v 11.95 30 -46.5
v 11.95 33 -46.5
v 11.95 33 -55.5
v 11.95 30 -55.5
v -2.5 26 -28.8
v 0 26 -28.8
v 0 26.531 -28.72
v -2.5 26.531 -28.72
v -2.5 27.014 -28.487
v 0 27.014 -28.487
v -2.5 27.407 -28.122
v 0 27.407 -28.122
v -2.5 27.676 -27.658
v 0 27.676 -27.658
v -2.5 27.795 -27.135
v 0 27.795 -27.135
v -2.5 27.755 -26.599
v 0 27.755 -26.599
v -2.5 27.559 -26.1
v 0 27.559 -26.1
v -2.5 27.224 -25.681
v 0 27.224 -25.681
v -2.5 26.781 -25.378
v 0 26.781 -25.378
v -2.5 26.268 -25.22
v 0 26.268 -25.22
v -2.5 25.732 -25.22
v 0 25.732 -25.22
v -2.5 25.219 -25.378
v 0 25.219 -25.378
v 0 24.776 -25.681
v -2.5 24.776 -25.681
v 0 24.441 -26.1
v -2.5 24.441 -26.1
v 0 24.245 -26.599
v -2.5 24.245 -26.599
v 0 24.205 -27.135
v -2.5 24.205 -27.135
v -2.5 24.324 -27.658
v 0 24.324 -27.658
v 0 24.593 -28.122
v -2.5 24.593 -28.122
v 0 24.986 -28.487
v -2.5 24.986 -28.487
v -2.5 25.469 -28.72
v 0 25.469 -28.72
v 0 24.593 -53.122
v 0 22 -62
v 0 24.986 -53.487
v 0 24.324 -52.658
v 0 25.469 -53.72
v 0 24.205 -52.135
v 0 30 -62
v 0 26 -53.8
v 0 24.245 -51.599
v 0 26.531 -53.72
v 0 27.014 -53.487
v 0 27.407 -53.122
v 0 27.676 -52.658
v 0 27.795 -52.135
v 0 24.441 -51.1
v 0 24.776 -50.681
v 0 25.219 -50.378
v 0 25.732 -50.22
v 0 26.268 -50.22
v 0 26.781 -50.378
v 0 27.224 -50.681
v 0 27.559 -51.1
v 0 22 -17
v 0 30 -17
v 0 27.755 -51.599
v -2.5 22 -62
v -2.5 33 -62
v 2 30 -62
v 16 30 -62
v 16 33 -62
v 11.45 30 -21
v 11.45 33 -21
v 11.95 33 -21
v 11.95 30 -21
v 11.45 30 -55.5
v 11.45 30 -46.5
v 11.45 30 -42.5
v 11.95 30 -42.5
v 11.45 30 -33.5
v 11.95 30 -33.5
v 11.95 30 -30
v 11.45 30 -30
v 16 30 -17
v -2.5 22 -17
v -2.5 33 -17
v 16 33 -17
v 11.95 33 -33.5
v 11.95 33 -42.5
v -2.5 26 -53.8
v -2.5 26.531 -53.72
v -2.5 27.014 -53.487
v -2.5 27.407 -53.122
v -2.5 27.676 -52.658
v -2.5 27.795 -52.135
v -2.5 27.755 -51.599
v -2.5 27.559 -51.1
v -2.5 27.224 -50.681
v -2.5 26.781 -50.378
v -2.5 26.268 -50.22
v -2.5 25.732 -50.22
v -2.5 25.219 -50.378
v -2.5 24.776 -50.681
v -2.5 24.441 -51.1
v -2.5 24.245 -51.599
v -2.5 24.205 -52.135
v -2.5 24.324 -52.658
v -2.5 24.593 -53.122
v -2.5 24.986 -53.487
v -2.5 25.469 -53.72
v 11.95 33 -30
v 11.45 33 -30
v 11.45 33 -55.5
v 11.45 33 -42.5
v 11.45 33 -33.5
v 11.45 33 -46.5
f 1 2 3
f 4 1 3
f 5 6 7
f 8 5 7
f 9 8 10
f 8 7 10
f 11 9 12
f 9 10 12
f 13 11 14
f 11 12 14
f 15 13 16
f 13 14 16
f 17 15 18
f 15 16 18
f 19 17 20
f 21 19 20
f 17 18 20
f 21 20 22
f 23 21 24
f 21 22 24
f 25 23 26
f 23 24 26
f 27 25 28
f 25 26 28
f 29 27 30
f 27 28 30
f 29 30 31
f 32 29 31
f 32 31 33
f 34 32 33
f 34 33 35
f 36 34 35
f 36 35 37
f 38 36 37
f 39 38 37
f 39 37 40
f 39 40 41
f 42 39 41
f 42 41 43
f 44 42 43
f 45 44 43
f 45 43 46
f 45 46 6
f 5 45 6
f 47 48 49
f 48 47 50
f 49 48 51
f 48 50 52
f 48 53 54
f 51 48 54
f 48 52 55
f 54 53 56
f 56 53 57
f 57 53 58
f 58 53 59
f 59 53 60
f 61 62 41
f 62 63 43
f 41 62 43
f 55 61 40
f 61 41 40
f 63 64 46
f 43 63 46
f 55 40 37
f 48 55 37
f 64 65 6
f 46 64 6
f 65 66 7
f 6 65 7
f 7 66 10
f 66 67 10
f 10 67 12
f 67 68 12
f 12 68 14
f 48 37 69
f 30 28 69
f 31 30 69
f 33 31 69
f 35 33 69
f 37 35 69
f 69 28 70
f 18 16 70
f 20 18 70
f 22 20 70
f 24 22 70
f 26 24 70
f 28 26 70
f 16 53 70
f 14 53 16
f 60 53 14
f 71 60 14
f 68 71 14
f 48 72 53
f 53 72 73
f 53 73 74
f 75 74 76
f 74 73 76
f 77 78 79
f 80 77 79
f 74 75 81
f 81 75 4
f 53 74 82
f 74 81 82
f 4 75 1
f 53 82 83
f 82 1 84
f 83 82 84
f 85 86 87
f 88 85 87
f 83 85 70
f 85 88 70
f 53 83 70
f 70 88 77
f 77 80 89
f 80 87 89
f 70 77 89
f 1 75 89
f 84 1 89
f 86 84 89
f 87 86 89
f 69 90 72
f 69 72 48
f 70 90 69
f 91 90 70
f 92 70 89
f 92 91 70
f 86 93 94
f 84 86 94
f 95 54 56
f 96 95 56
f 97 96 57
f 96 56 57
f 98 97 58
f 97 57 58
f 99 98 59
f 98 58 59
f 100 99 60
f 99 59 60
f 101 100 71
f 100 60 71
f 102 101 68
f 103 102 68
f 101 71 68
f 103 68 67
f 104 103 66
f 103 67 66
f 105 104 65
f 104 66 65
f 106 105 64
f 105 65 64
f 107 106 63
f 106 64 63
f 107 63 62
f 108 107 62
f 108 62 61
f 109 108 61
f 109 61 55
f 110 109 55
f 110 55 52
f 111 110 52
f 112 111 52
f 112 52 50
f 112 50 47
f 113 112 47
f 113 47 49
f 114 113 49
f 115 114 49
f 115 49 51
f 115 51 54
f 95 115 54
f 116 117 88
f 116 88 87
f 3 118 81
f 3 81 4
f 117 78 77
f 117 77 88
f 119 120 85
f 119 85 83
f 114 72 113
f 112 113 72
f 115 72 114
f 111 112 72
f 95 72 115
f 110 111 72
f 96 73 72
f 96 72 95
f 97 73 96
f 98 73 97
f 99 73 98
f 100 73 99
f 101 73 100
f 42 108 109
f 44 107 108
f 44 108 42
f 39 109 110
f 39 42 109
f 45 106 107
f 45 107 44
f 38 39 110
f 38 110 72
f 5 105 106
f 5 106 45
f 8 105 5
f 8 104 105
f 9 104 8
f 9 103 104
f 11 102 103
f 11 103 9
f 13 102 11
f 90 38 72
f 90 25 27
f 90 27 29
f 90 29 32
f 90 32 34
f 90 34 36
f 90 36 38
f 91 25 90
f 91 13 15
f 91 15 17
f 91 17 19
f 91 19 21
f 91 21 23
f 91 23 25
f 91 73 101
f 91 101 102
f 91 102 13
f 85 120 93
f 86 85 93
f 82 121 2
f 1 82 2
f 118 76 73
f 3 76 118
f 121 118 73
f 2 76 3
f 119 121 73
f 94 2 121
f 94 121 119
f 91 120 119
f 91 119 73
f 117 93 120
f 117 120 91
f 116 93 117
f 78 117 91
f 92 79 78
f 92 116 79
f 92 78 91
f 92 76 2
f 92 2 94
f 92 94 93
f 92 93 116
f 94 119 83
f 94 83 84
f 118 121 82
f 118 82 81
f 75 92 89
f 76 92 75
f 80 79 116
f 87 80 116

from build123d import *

# Parameters (mm, degrees)
SKETCH1_W               = 70.4
SKETCH1_H               = 2
BOSS_EXTRUDE2_DEPTH     = 10
SKETCH2_W               = 2
SKETCH2_H               = 55
BOSS_EXTRUDE3_DEPTH     = 10
SKETCH3_W               = 19
SKETCH3_H               = 3
BOSS_EXTRUDE4_DEPTH     = 2
SKETCH4_W               = 15
SKETCH4_H               = 10
CUT_EXTRUDE2_DEPTH      = 2
SKETCH5_W               = 2
SKETCH5_H               = 3
BOSS_EXTRUDE5_DEPTH     = 1
SKETCH6_W               = 2
SKETCH6_H               = 3
BOSS_EXTRUDE6_DEPTH     = 1
SKETCH7_W               = 57
SKETCH7_H               = 2
BOSS_EXTRUDE7_DEPTH     = 6.6
SKETCH8_W               = 57
SKETCH8_H               = 2
BOSS_EXTRUDE8_DEPTH     = 6.6
BOSS_EXTRUDE9_DEPTH     = 5
SKETCH12_W              = 2
SKETCH12_H              = 5
SKETCH12_H_2            = 40
SKETCH12_H_3            = 30
BOSS_EXTRUDE10_DEPTH    = 20
BOSS_EXTRUDE11_DEPTH    = 3
SKETCH14_W              = 0.5
SKETCH14_H              = 9
CUT_EXTRUDE3_DEPTH      = 3
SKETCH15_W              = 38.4
SKETCH15_H              = 45
CUT_EXTRUDE4_DEPTH      = 3
BOSS_EXTRUDE12_DEPTH    = 0.5
SKETCH17_R              = 1.8
SKETCH17_W              = 3
SKETCH17_H              = 5
CUT_EXTRUDE6_DEPTH      = 3
CUT_EXTRUDE8_DEPTH      = 32
CUT_EXTRUDE8_DEPTH_BACK = 49
SKETCH19_W              = 94.558020587
SKETCH19_H              = 51.225034616
CUT_EXTRUDE9_DEPTH      = 93
CUT_EXTRUDE9_DEPTH_BACK = 18
SKETCH20_W              = 91.945359737
SKETCH20_H              = 40.424662202
SKETCH21_W              = 45
SKETCH21_H              = 3
BOSS_EXTRUDE14_DEPTH    = 2.5
SKETCH22_W              = 2.5
SKETCH22_H              = 45
BOSS_EXTRUDE15_DEPTH    = 8
SKETCH23_R              = 1.8
CUT_EXTRUDE10_DEPTH     = 10


with BuildPart() as part:
    # Sketch1 → Boss-Extrude2 (new body)
    with BuildSketch(Plane(origin=(0, 0, 0), x_dir=(1, 0, 0), z_dir=(0, 1, 0))):
        with Locations((35.2, 1)):
            Rectangle(SKETCH1_W, SKETCH1_H)
    extrude(amount=BOSS_EXTRUDE2_DEPTH)

    # Sketch2 → Boss-Extrude3 (add)
    with BuildSketch(Plane(origin=(0, 10, 0), x_dir=(1, 0, 0), z_dir=(0, 1, 0))):
        with Locations((1, 29.5)):
            Rectangle(SKETCH2_W, SKETCH2_H)
        with Locations((69.4, 29.5)):
            Rectangle(SKETCH2_W, SKETCH2_H)
    extrude(amount=-BOSS_EXTRUDE3_DEPTH)

    # Sketch3 → Boss-Extrude4 (add)
    with BuildSketch(Plane.XY):
        with Locations((35.2, 11.5)):
            Rectangle(SKETCH3_W, SKETCH3_H)
    extrude(amount=-BOSS_EXTRUDE4_DEPTH)

    # Sketch4 → Cut-Extrude2 (cut)
    with BuildSketch(Plane.XY):
        with Locations((35.2, 5)):
            Rectangle(SKETCH4_W, SKETCH4_H)
    extrude(amount=-CUT_EXTRUDE2_DEPTH, mode=Mode.SUBTRACT)

    # Sketch5 → Boss-Extrude5 (add)
    with BuildSketch(Plane.ZY.offset(-25.7)):
        with Locations((-1, 11.5)):
            Rectangle(SKETCH5_W, SKETCH5_H)
    extrude(amount=BOSS_EXTRUDE5_DEPTH)

    # Sketch6 → Boss-Extrude6 (add)
    with BuildSketch(Plane(origin=(44.7, 0, 0), x_dir=(0, 0, -1), z_dir=(1, 0, 0))):
        with Locations((1, 11.5)):
            Rectangle(SKETCH6_W, SKETCH6_H)
    extrude(amount=BOSS_EXTRUDE6_DEPTH)

    # Sketch7 → Boss-Extrude7 (add)
    with BuildSketch(Plane.ZY):
        with Locations((-28.5, 1)):
            Rectangle(SKETCH7_W, SKETCH7_H)
    extrude(amount=BOSS_EXTRUDE7_DEPTH)

    # Sketch8 → Boss-Extrude8 (add)
    with BuildSketch(Plane(origin=(70.4, 0, 0), x_dir=(0, 0, -1), z_dir=(1, 0, 0))):
        with Locations((28.5, 1)):
            Rectangle(SKETCH8_W, SKETCH8_H)
    extrude(amount=BOSS_EXTRUDE8_DEPTH)

    # Sketch10 → Boss-Extrude9 (add)
    with BuildSketch(Plane(origin=(0, 0, -57), x_dir=(-1, 0, 0), z_dir=(0, 0, -1))):
        Polygon((-2, 10), (-2, 0), (6.6, 0), (6.6, 2), (0, 2), (0, 10), align=None)
        Polygon((-77, 0), (-68.4, 0), (-68.4, 10), (-70.4, 10), (-70.4, 2), (-77, 2), align=None)
    extrude(amount=BOSS_EXTRUDE9_DEPTH)

    # Sketch12 → Boss-Extrude10 (add)
    with BuildSketch(Plane(origin=(0, 10, 0), x_dir=(1, 0, 0), z_dir=(0, 1, 0))):
        with Locations((1, 59.5)):
            Rectangle(SKETCH12_W, SKETCH12_H)
        with Locations((1, 37)):
            Rectangle(SKETCH12_W, SKETCH12_H_2)
        with Locations((69.4, 42)):
            Rectangle(SKETCH12_W, SKETCH12_H_3)
        with Locations((69.4, 59.5)):
            Rectangle(SKETCH12_W, SKETCH12_H)
    extrude(amount=BOSS_EXTRUDE10_DEPTH)

    # Sketch13 → Boss-Extrude11 (add)
    with BuildSketch(Plane(origin=(0, 30, 0), x_dir=(1, 0, 0), z_dir=(0, 1, 0))):
        Polygon((0, 17), (35.2, 17), (35.2, 27), (70.4, 27), (70.4, 62), (0, 62), align=None)
    extrude(amount=BOSS_EXTRUDE11_DEPTH)

    # Sketch14 → Cut-Extrude3 (cut)
    with BuildSketch(Plane(origin=(0, 33, 0), x_dir=(1, 0, 0), z_dir=(0, 1, 0))):
        with Locations((11.7, 51)):
            Rectangle(SKETCH14_W, SKETCH14_H)
        with Locations((11.7, 38)):
            Rectangle(SKETCH14_W, SKETCH14_H)
        with Locations((11.7, 25.5)):
            Rectangle(SKETCH14_W, SKETCH14_H)
        with Locations((58.2, 51)):
            Rectangle(SKETCH14_W, SKETCH14_H)
        with Locations((58.2, 38)):
            Rectangle(SKETCH14_W, SKETCH14_H)
    extrude(amount=-CUT_EXTRUDE3_DEPTH, mode=Mode.SUBTRACT)

    # Sketch15 → Cut-Extrude4 (cut)
    with BuildSketch(Plane(origin=(0, 33, 0), x_dir=(1, 0, 0), z_dir=(0, 1, 0))):
        with Locations((35.2, 39.5)):
            Rectangle(SKETCH15_W, SKETCH15_H)
    extrude(amount=-CUT_EXTRUDE4_DEPTH, mode=Mode.SUBTRACT)

    # Sketch16 → Boss-Extrude12 (add)
    with BuildSketch(Plane.XY):
        Polygon((-6.6, 0), (27.7, 0), (27.7, 10), (42.7, 10), (42.7, 0), (77, 0), (77, 2), (70.4, 2), (70.4, 10), (45.7, 10), (45.7, 13), (24.7, 13), (24.7, 10), (0, 10), (0, 2), (-6.6, 2), align=None)
    extrude(amount=BOSS_EXTRUDE12_DEPTH)

    # Sketch17 → Cut-Extrude6 (cut)
    with BuildSketch(Plane(origin=(0, 2, 0), x_dir=(1, 0, 0), z_dir=(0, 1, 0))):
        with Locations(Location((-3.3, 55, 0), (0, 0, 270))):
            Circle(SKETCH17_R)
        with Locations(Location((73.7, 55, 0), (0, 0, 270))):
            Circle(SKETCH17_R)
        with Locations(Location((-3.3, 6.5, 0), (0, 0, 270))):
            Circle(SKETCH17_R)
        with Locations(Location((73.7, 6.5, 0), (0, 0, 270))):
            Circle(SKETCH17_R)
        with Locations(Location((-3.3, 30.75, 0), (0, 0, 270))):
            Circle(SKETCH17_R)
        with Locations(Location((73.7, 30.75, 0), (0, 0, 270))):
            Circle(SKETCH17_R)
        with Locations((-3.3, 14.5)):
            Rectangle(SKETCH17_W, SKETCH17_H)
        with Locations((73.7, 14.5)):
            Rectangle(SKETCH17_W, SKETCH17_H)
    extrude(amount=-CUT_EXTRUDE6_DEPTH, mode=Mode.SUBTRACT)

    # Sketch19 → Cut-Extrude8 (cut, two sides: drawn at the far end of the back side and taken through both)
    with BuildSketch(Plane(origin=(70.4, 0, 0), x_dir=(0, 0, -1), z_dir=(1, 0, 0)).offset(-CUT_EXTRUDE8_DEPTH_BACK)):
        with Locations((14.720989707, 7.387482692)):
            Rectangle(SKETCH19_W, SKETCH19_H)
    extrude(amount=CUT_EXTRUDE8_DEPTH + CUT_EXTRUDE8_DEPTH_BACK, mode=Mode.SUBTRACT)

    # Sketch20 → Cut-Extrude9 (cut, two sides: drawn at the far end of the back side and taken through both)
    with BuildSketch(Plane(origin=(2, 0, 0), x_dir=(0, 0, -1), z_dir=(1, 0, 0)).offset(-CUT_EXTRUDE9_DEPTH_BACK)):
        with Locations((16.027320132, 9.787668899)):
            Rectangle(SKETCH20_W, SKETCH20_H)
    extrude(amount=CUT_EXTRUDE9_DEPTH + CUT_EXTRUDE9_DEPTH_BACK, mode=Mode.SUBTRACT)

    # Sketch21 → Boss-Extrude14 (add)
    with BuildSketch(Plane.ZY):
        with Locations((-39.5, 31.5)):
            Rectangle(SKETCH21_W, SKETCH21_H)
    extrude(amount=BOSS_EXTRUDE14_DEPTH)

    # Sketch22 → Boss-Extrude15 (add)
    with BuildSketch(Plane.XZ.offset(-30)):
        with Locations((-1.25, -39.5)):
            Rectangle(SKETCH22_W, SKETCH22_H)
    extrude(amount=BOSS_EXTRUDE15_DEPTH)

    # Sketch23 → Cut-Extrude10 (cut)
    with BuildSketch(Plane(origin=(0, 0, 0), x_dir=(0, 0, -1), z_dir=(1, 0, 0))):
        with Locations((27, 26)):
            Circle(SKETCH23_R)
        with Locations((52, 26)):
            Circle(SKETCH23_R)
    extrude(amount=-CUT_EXTRUDE10_DEPTH, mode=Mode.SUBTRACT)


solid = part.part
